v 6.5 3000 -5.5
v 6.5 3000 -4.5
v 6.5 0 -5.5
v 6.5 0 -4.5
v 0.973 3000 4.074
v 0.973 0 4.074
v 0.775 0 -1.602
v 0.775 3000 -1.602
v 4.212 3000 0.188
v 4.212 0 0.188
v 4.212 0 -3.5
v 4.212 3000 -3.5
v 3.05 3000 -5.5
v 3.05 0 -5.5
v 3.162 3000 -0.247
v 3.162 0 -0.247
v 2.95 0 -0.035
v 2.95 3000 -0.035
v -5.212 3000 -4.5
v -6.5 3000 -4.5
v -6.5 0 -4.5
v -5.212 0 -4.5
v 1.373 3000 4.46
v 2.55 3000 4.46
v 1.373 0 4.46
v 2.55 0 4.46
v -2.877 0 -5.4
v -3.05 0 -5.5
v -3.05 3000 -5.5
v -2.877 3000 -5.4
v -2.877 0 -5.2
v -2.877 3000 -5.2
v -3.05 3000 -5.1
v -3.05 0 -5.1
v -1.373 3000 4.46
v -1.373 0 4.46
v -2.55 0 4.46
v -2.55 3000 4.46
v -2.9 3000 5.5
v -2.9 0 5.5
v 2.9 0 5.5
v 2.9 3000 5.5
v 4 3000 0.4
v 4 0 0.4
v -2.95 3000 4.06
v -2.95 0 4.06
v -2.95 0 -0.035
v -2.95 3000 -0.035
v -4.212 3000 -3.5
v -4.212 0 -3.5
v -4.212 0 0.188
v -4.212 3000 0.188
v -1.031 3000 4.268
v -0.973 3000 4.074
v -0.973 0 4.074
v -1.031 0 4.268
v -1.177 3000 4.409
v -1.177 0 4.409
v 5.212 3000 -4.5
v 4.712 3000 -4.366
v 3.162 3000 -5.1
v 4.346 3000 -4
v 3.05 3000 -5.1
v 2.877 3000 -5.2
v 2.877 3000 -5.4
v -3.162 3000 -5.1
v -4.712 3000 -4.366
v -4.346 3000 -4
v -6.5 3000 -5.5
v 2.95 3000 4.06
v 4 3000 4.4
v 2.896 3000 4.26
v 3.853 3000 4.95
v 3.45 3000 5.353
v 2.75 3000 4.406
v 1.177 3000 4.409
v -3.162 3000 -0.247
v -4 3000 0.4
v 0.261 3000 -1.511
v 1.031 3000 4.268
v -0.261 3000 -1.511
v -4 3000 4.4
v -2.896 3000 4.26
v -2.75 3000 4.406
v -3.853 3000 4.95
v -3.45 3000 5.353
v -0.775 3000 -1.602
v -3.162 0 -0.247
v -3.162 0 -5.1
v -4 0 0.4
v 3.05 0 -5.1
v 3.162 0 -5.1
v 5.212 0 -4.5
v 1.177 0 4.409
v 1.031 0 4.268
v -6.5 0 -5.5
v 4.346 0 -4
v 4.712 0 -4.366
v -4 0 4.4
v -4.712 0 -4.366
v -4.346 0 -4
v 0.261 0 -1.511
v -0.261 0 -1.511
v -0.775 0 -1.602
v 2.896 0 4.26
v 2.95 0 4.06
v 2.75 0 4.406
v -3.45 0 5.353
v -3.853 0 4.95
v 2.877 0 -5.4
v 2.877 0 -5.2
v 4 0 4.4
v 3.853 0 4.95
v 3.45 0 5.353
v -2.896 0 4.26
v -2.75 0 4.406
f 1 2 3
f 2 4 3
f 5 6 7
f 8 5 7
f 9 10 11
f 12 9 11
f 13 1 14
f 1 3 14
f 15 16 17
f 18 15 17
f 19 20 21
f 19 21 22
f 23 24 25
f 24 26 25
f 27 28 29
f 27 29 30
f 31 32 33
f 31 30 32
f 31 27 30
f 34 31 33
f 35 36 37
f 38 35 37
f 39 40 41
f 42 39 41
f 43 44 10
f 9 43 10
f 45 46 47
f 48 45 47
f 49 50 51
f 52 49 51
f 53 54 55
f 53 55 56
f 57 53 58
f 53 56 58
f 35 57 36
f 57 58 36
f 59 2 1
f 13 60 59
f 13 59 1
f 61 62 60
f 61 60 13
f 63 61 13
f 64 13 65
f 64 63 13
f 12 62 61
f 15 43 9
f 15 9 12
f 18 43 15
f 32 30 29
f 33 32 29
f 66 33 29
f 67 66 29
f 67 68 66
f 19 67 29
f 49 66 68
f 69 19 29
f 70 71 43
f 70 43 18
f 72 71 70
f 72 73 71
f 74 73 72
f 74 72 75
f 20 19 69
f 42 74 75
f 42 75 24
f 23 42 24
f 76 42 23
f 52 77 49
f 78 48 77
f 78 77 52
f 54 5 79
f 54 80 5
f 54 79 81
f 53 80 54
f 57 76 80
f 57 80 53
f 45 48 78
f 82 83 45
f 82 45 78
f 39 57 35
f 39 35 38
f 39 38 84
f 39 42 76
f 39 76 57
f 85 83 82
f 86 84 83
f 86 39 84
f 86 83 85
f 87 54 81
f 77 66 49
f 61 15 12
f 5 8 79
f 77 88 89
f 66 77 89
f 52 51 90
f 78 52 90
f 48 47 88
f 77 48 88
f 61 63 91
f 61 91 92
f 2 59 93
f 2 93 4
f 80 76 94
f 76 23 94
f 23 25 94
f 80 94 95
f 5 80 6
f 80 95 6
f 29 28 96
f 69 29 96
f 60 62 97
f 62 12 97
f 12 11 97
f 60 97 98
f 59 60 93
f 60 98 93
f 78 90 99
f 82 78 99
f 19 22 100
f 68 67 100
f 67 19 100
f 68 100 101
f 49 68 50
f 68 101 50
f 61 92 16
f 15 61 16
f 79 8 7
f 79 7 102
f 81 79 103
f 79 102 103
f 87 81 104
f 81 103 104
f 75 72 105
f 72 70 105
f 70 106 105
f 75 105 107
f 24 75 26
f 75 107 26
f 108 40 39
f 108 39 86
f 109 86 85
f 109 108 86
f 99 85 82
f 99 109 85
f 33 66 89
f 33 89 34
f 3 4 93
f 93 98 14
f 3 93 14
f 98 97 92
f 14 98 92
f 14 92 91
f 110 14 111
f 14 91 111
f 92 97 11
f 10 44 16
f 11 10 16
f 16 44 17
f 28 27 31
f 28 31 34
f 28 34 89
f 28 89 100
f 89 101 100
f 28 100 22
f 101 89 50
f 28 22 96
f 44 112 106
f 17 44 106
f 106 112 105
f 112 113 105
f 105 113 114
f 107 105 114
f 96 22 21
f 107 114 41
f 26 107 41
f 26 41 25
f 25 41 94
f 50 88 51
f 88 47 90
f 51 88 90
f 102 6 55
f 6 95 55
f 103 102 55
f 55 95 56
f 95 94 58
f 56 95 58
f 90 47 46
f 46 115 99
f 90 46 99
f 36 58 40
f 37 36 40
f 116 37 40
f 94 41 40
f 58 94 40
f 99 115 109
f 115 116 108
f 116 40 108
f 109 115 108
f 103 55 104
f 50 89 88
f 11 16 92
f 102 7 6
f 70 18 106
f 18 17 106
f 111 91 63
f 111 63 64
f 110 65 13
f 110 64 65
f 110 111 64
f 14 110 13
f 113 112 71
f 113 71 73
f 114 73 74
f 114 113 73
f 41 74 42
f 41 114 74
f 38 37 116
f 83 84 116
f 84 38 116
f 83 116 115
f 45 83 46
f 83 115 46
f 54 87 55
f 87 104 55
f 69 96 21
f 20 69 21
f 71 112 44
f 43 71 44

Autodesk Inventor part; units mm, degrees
ref_plane "YZ Plane" through (0, 0, 0) normal (1, 0, 0) x (0, 1, 0)
ref_plane "Start Plane" through (0, 0, 0) normal (0, 1, 0) x (-1, 0, 0)
ref_plane "End Plane" through (0, 100, 0) normal (0, 1, 0) x (-1, 0, 0)
sketch "Sketch1" plane through (0, 0, 0) normal (0, 1, 0) x (-1, 0, 0)
  arc A0 (-3.05, -5.5) -> (-3.05, -5.1) centre (-3.05, -5.3) ccw
  line L0 (-3.05, -5.1) -> (-3.1625, -5.1)
  line L1 (-3.1625, -5.1) -> (-3.1625, -0.2474)
  line L2 (-3.1625, -0.2474) -> (-2.95, -0.0349)
  line L3 (-2.95, -0.0349) -> (-2.95, 4.06)
  arc A1 (-2.55, 4.46) -> (-2.95, 4.06) centre (-2.55, 4.06) ccw
  line L4 (-2.55, 4.46) -> (-1.373, 4.46)
  arc A2 (-0.9732, 4.074) -> (-1.373, 4.46) centre (-1.373, 4.06) ccw
  line L5 (-0.9732, 4.074) -> (-0.775, -1.6018)
  arc A3 (0.775, -1.6018) -> (-0.775, -1.6018) centre (0, -4.5) ccw
  line L6 (0.775, -1.6018) -> (0.9732, 4.074)
  arc A4 (1.373, 4.46) -> (0.9732, 4.074) centre (1.373, 4.06) ccw
  line L7 (1.373, 4.46) -> (2.55, 4.46)
  arc A5 (2.95, 4.06) -> (2.55, 4.46) centre (2.55, 4.06) ccw
  line L8 (2.95, 4.06) -> (2.95, -0.0349)
  line L9 (2.95, -0.0349) -> (3.1625, -0.2474)
  line L10 (3.1625, -0.2474) -> (3.1625, -5.1)
  line L11 (3.1625, -5.1) -> (3.05, -5.1)
  arc A6 (3.05, -5.1) -> (3.05, -5.5) centre (3.05, -5.3) ccw
  line L12 (3.05, -5.5) -> (6.5, -5.5)
  line L13 (6.5, -5.5) -> (6.5, -4.5)
  line L14 (6.5, -4.5) -> (5.2125, -4.5)
  arc A7 (4.2125, -3.5) -> (5.2125, -4.5) centre (5.2125, -3.5) ccw
  line L15 (4.2125, -3.5) -> (4.2125, 0.1875)
  line L16 (4.2125, 0.1875) -> (4, 0.4)
  line L17 (4, 0.4) -> (4, 4.4)
  arc A8 (4, 4.4) -> (2.9, 5.5) centre (2.9, 4.4) ccw
  line L18 (2.9, 5.5) -> (-2.9, 5.5)
  arc A9 (-2.9, 5.5) -> (-4, 4.4) centre (-2.9, 4.4) ccw
  line L19 (-4, 4.4) -> (-4, 0.4)
  line L20 (-4, 0.4) -> (-4.2125, 0.1875)
  line L21 (-4.2125, 0.1875) -> (-4.2125, -3.5)
  arc A10 (-5.2125, -4.5) -> (-4.2125, -3.5) centre (-5.2125, -3.5) ccw
  line L22 (-5.2125, -4.5) -> (-6.5, -4.5)
  line L23 (-6.5, -4.5) -> (-6.5, -5.5)
  line L24 (-6.5, -5.5) -> (-3.05, -5.5)
  point P0 (0, 0)
extrude "Body" add sketch "Sketch1" along normal blind 3000 from surface at 0
sketch "Sketch2" plane through (0, 0, 0) normal (0, 1, 0) x (-1, 0, 0)
  line L0 (0, 0) -> (10, 0)
ref_plane "Work Plane3" through (0, 0, 0) normal (0, 0, -1) x (-1, 0, 0)
sketch "Sketch3" plane through (0, 0, 0) normal (0, 0, -1) x (-1, 0, 0)
  line L0 (-2, 0) -> (12, 0)
  line L1 (-2, 100) -> (12, 100)
  dimension "d7" = 100
equation "\"G_OFFSET_START\" = 0"
equation "\"G_OFFSET_END\" = 0"
equation "\"G_L\" = d7"
properties part number "13-106"
